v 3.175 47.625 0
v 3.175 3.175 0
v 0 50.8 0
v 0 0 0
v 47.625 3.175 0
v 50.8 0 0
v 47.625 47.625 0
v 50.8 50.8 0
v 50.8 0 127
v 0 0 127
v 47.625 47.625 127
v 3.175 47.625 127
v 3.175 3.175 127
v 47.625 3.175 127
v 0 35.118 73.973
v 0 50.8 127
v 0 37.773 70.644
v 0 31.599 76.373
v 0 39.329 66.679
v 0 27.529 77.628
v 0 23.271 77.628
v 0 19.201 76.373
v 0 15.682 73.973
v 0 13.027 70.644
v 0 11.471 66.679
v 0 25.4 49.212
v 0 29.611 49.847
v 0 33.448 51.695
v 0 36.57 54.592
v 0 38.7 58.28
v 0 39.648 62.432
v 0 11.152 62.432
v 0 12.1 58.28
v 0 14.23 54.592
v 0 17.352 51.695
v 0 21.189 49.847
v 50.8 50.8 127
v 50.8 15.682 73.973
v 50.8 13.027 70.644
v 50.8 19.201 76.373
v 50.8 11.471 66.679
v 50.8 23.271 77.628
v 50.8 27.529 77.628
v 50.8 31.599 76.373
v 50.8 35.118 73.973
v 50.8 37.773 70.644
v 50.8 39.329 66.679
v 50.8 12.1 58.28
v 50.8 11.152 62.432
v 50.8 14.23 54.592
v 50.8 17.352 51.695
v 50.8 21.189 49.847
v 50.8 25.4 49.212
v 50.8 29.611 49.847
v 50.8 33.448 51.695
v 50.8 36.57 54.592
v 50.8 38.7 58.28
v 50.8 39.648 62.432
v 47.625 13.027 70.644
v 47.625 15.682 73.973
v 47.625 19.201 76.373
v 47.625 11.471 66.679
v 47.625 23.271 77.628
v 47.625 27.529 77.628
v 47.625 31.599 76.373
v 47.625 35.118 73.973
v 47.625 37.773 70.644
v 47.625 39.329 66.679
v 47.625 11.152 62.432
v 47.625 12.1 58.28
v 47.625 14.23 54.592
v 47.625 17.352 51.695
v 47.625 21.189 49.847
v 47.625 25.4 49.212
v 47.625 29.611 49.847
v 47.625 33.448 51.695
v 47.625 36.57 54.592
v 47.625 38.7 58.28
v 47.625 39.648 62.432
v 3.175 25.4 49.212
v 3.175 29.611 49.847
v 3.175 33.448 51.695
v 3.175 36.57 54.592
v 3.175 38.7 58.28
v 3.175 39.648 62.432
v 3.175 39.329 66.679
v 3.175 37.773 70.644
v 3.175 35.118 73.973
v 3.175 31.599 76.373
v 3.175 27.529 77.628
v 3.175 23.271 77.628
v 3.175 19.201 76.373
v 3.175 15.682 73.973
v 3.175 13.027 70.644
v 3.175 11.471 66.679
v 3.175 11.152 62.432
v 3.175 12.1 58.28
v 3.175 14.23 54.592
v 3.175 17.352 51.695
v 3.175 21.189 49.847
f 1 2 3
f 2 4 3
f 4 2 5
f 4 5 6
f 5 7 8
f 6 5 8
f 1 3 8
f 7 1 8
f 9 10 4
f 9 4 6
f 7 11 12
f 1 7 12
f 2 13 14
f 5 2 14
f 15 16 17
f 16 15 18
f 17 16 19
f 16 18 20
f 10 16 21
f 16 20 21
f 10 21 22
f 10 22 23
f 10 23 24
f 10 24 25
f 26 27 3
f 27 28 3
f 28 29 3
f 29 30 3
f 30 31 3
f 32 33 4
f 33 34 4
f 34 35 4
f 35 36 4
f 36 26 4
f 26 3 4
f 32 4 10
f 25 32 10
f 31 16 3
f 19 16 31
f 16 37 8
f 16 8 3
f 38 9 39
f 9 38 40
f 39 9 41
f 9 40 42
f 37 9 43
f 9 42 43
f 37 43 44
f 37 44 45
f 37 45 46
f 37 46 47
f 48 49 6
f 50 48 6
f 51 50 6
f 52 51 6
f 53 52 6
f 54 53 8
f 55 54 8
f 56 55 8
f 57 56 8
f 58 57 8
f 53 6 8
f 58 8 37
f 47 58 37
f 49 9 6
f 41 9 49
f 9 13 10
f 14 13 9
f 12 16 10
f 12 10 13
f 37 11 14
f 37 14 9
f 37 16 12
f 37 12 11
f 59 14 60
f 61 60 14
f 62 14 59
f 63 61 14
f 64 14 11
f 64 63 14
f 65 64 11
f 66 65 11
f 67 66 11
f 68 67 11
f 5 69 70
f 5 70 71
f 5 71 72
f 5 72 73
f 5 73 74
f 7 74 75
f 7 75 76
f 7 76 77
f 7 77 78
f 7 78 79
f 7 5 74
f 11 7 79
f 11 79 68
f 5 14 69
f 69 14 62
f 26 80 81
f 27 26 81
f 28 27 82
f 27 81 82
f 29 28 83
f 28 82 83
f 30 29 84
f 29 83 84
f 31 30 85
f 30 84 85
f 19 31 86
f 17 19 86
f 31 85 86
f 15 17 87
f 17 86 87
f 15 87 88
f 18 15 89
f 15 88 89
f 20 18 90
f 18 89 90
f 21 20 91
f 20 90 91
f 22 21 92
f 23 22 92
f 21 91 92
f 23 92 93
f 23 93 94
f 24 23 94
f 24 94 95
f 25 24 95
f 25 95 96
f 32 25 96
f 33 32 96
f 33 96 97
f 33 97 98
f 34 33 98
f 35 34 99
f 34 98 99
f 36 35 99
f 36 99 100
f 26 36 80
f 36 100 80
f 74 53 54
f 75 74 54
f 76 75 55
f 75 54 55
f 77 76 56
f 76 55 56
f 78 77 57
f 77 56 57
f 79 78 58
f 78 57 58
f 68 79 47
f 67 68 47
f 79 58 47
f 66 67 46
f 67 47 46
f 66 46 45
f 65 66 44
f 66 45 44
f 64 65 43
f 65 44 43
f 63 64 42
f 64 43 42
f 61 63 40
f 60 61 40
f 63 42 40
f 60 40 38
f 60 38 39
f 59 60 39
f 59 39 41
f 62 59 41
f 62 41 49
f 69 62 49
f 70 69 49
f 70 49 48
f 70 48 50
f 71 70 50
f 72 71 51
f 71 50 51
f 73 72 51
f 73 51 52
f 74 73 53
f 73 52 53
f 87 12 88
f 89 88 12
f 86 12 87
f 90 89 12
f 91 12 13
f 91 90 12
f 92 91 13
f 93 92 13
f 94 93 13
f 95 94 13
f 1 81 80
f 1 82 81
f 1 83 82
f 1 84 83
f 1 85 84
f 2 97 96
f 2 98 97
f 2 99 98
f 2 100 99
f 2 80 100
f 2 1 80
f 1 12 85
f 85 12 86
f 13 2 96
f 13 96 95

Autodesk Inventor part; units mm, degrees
ref_plane "YZ Plane" through (0, 0, 0) normal (1, 0, 0) x (0, 1, 0)
ref_plane "XZ Plane" through (0, 0, 0) normal (0, 1, 0) x (-1, 0, 0)
ref_plane "XY Plane" through (0, 0, 0) normal (0, 0, 1) x (1, 0, 0)
sketch "Sketch1" plane through (0, 0, 0) normal (0, 0, 1) x (1, 0, 0)
  line L0 (0, 0) -> (50.8, 0)
  line L1 (50.8, 0) -> (50.8, 50.8)
  line L2 (50.8, 50.8) -> (0, 50.8)
  line L3 (0, 50.8) -> (0, 0)
  line L4 (3.175, 3.175) -> (47.625, 3.175)
  line L5 (47.625, 3.175) -> (47.625, 47.625)
  line L6 (47.625, 47.625) -> (3.175, 47.625)
  line L7 (3.175, 47.625) -> (3.175, 3.175)
  dimension "d0" = 50.8
  dimension "d1" = 50.8
  dimension "d2" = 3.175
  dimension "d3" = 3.175
  dimension "d4" = 3.175
  dimension "d5" = 3.175
extrude "2x2x.125 Box Beam" add sketch "Sketch1" along normal blind 127
sketch "Sketch2" plane through (50.8, 0, 0) normal (1, 0, 0) x (0, 0, -1)
  line L0 (0, 0) -> (0, 50.8) projected
  line L1 (0, 0) -> (-127, 0) projected
  circle A0 centre (-63.5, 25.4) radius 14.2875
  dimension "d8" = 28.575
  dimension "d9" = 63.5
  dimension "d10" = 25.4
extrude "FR8 Bearing Hole" cut sketch "Sketch2" against normal through all
equation "\"d3\" = d2"
equation "\"d4\" = d3"
equation "\"d5\" = d4"
properties part number "Box Beam"
